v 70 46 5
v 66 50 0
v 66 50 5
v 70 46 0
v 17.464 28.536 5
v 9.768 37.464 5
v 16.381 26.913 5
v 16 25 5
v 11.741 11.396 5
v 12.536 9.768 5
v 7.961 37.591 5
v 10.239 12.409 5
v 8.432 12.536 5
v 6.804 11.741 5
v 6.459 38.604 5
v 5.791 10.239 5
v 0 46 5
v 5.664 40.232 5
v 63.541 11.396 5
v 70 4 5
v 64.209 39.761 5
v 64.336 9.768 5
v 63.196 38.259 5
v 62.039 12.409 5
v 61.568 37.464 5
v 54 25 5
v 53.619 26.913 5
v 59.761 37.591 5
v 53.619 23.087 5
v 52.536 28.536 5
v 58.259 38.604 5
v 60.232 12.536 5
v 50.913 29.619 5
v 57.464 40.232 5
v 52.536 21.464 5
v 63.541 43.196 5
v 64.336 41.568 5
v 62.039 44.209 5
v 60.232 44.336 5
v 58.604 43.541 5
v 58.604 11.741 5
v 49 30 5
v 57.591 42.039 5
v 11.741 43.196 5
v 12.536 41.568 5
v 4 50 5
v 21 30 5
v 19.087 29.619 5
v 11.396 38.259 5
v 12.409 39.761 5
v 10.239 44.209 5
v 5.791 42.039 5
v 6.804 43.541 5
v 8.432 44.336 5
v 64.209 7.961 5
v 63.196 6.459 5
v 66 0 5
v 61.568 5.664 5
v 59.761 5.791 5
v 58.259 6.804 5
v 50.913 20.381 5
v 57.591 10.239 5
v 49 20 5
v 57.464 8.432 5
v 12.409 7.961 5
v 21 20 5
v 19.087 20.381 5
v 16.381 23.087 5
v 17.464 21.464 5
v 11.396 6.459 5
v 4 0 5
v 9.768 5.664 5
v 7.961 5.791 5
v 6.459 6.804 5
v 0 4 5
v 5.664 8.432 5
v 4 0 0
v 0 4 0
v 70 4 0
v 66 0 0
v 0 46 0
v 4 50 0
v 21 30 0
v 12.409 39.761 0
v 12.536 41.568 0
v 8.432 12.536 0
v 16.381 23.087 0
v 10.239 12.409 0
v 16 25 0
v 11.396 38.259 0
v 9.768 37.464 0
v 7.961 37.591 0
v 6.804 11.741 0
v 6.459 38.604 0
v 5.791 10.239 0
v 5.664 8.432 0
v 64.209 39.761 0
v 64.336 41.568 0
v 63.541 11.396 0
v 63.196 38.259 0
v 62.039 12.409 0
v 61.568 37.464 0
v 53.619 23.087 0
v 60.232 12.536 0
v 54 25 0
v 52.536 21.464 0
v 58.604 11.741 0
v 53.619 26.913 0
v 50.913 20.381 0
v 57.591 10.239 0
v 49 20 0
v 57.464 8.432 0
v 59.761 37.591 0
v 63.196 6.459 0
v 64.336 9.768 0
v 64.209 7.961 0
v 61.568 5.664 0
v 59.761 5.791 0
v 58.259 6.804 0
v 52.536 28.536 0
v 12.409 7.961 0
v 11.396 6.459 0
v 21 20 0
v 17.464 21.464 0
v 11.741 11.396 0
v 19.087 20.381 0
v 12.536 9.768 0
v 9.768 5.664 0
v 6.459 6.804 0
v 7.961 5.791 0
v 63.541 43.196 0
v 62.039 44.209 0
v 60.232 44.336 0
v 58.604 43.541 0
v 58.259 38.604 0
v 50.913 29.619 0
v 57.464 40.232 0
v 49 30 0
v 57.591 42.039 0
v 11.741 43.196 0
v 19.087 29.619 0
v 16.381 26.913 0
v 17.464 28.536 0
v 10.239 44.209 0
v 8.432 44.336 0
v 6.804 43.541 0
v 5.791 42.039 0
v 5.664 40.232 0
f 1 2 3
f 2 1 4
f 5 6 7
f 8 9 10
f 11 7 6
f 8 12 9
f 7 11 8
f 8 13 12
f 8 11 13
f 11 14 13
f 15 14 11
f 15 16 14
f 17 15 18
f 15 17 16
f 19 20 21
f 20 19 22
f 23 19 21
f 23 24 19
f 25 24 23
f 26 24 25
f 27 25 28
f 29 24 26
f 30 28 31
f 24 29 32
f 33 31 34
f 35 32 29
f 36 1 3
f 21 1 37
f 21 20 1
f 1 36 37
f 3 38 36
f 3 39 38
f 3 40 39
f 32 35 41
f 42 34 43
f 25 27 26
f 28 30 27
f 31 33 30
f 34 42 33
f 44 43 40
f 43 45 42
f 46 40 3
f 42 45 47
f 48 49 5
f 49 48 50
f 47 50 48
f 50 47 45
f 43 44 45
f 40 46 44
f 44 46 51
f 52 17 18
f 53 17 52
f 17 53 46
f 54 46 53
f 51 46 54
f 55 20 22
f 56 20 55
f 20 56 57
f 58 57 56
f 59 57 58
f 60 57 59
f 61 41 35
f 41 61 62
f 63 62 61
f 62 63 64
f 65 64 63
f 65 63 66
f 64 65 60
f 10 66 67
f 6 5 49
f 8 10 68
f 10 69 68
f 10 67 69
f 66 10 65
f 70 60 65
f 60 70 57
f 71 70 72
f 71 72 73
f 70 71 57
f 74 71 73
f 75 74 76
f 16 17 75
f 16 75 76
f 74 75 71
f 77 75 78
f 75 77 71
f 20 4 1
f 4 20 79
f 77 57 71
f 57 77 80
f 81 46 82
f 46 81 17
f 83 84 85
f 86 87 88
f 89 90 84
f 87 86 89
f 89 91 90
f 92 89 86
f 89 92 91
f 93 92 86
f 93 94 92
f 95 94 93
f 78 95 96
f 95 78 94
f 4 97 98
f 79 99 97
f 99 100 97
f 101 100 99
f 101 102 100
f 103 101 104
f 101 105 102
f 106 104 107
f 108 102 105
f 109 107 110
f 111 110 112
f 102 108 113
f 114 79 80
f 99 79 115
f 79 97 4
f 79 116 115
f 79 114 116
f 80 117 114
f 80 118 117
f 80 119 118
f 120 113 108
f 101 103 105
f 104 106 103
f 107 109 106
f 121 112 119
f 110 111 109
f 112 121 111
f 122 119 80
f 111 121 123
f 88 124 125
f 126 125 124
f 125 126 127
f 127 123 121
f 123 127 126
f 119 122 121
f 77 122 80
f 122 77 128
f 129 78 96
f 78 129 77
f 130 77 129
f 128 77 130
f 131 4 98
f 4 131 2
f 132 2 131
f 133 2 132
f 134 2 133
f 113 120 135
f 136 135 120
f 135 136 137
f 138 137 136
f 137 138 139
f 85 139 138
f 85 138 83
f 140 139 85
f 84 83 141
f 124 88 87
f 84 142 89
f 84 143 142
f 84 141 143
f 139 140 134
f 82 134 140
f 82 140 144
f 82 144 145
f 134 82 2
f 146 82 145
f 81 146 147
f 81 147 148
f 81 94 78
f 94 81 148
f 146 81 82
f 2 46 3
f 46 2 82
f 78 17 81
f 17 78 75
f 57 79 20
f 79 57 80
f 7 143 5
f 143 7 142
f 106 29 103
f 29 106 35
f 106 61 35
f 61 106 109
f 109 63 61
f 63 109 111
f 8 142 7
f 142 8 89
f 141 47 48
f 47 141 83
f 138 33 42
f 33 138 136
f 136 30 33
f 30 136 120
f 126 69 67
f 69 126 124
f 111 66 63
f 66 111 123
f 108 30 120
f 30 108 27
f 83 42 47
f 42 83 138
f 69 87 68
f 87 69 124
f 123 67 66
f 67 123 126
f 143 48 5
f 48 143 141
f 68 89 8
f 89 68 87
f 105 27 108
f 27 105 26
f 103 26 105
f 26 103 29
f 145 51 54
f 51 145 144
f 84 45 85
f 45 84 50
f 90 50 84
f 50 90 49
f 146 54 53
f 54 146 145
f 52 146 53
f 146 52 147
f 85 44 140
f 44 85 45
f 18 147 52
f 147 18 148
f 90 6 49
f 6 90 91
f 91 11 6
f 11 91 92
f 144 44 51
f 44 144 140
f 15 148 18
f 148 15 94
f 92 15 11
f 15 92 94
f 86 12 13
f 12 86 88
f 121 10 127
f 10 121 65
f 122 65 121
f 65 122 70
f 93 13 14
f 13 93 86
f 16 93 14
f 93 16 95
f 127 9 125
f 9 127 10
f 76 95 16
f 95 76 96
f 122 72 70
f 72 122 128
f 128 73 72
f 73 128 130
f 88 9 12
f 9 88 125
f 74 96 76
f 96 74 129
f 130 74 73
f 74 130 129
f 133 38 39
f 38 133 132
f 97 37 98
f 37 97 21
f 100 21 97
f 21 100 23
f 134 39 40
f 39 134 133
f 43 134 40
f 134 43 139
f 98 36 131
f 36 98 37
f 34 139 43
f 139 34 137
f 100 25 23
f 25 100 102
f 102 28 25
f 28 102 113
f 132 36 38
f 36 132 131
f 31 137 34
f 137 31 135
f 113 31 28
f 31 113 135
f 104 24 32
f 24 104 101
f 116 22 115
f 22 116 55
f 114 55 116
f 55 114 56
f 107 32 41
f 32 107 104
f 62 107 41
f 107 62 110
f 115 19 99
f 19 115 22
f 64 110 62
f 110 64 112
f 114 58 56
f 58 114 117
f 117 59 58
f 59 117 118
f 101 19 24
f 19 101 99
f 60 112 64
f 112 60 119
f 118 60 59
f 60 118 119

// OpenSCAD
$fn = 32;

// ----------------------------------------------------------------------
// Bracket plate: slot plate 70 x 50
// ----------------------------------------------------------------------

// --- parameters (mm) ---
hole_r = 3.5;             // bolt hole radius
plate_t = 5;              // plate thickness, Z (extrusion height)
plate_l = 70;             // plate length
plate_w = 50;             // plate width
slot_l = 28;              // slot straight length
slot_r = 5;               // slot end radius

slot_len = slot_l + 2 * slot_r;
slot_w = 2 * slot_r;
hole_d2 = 2 * hole_r;

profile = [[4, 0], [66, 0], [70, 4], [70, 46], [66, 50], [4, 50], [0, 46], [0, 4]];  // primary outline, 8 points, counter clockwise
void_1 = [[49, 20], [50.913, 20.381], [52.536, 21.464], [53.619, 23.087], [54, 25], [53.619, 26.913], [52.536, 28.536], [50.913, 29.619], [49, 30], [21, 30], [19.087, 29.619], [17.464, 28.536], [16.381, 26.913], [16, 25], [16.381, 23.087], [17.464, 21.464], [19.087, 20.381], [21, 20]];  // grip slot, 18 points
void_2 = [[12.536, 41.568], [11.741, 43.196], [10.239, 44.209], [8.432, 44.336], [6.804, 43.541], [5.791, 42.039], [5.664, 40.232], [6.459, 38.604], [7.961, 37.591], [9.768, 37.464], [11.396, 38.259], [12.409, 39.761]];  // corner hole, 12 points
void_3 = [[12.536, 9.768], [11.741, 11.396], [10.239, 12.409], [8.432, 12.536], [6.804, 11.741], [5.791, 10.239], [5.664, 8.432], [6.459, 6.804], [7.961, 5.791], [9.768, 5.664], [11.396, 6.459], [12.409, 7.961]];  // corner hole, 12 points
void_4 = [[64.336, 41.568], [63.541, 43.196], [62.039, 44.209], [60.232, 44.336], [58.604, 43.541], [57.591, 42.039], [57.464, 40.232], [58.259, 38.604], [59.761, 37.591], [61.568, 37.464], [63.196, 38.259], [64.209, 39.761]];  // corner hole, 12 points
void_5 = [[64.336, 9.768], [63.541, 11.396], [62.039, 12.409], [60.232, 12.536], [58.604, 11.741], [57.591, 10.239], [57.464, 8.432], [58.259, 6.804], [59.761, 5.791], [61.568, 5.664], [63.196, 6.459], [64.209, 7.961]];  // corner hole, 12 points

// --- the one profile operation ---
difference() {
  linear_extrude(height = plate_t) polygon(points = profile);
  translate([0, 0, -1])
    linear_extrude(height = plate_t + 2) polygon(points = void_1);
  translate([0, 0, -1])
    linear_extrude(height = plate_t + 2) polygon(points = void_2);
  translate([0, 0, -1])
    linear_extrude(height = plate_t + 2) polygon(points = void_3);
  translate([0, 0, -1])
    linear_extrude(height = plate_t + 2) polygon(points = void_4);
  translate([0, 0, -1])
    linear_extrude(height = plate_t + 2) polygon(points = void_5);
}
